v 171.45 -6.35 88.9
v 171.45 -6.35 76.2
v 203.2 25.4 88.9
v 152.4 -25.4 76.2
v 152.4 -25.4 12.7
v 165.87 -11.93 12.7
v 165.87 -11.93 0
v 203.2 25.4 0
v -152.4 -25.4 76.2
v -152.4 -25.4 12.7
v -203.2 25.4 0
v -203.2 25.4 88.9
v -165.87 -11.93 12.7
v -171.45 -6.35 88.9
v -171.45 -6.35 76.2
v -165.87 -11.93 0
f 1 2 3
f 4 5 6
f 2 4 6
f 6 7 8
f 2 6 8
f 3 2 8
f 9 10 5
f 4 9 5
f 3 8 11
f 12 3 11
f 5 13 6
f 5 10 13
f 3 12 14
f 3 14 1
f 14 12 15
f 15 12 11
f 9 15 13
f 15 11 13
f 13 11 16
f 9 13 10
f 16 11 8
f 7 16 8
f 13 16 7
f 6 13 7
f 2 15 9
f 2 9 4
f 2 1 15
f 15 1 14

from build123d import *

# Parameters (mm, degrees)
F0_W      = 304.8
F0_H      = 50.8
F1_DEPTH  = 88.9
F2_W      = 304.8
F2_H      = 19.05
F3_DEPTH  = 12.7
F5_DEPTH  = 88.9
F7_DEPTH  = 12.7
F9_DEPTH  = 88.9
F11_DEPTH = 12.7
F13_DEPTH = 12.7


with BuildPart() as f1:
    # F0 (on Top) → F1 (new body)
    with BuildSketch(Plane.XY):
        Rectangle(F0_W, F0_H)
    extrude(amount=F1_DEPTH)

    # F2 (on face) → F3 (cut)
    with BuildSketch(Plane.XY.offset(88.9)):
        with Locations((0, -15.875)):
            Rectangle(F2_W, F2_H)
    extrude(amount=-F3_DEPTH, mode=Mode.SUBTRACT)

    # F4 (on Top) → F5 (join)
    with BuildSketch(Plane.XY):
        Polygon((152.4, 25.4), (152.4, -25.4), (203.2, 25.4), align=None)
    extrude(amount=F5_DEPTH)

    # F6 (on face) → F7 (cut)
    with BuildSketch(Plane.XY.offset(88.9)):
        Polygon((171.45, -6.35), (152.4, -6.35), (152.4, -25.4), align=None)
    extrude(amount=-F7_DEPTH, mode=Mode.SUBTRACT)

    # F8 (on Top) → F9 (join)
    with BuildSketch(Plane.XY):
        Polygon((-203.2, 25.4), (-152.4, -25.4), (-152.4, 25.4), align=None)
    extrude(amount=F9_DEPTH)

    # F10 (on face) → F11 (cut)
    with BuildSketch(Plane.XY.offset(88.9)):
        Polygon((-171.45, -6.35), (-152.4, -25.4), (-152.4, -6.35), align=None)
    extrude(amount=-F11_DEPTH, mode=Mode.SUBTRACT)

    # F12 (on face) → F13 (cut)
    with BuildSketch(Plane(origin=(0, 0, 0), x_dir=(1, 0, 0), z_dir=(0, 0, -1))):
        Polygon((-165.870384, 11.929616), (165.870384, 11.929616), (152.4, 25.4), (-152.4, 25.4), align=None)
    extrude(amount=-F13_DEPTH, mode=Mode.SUBTRACT)


solid = f1.part
